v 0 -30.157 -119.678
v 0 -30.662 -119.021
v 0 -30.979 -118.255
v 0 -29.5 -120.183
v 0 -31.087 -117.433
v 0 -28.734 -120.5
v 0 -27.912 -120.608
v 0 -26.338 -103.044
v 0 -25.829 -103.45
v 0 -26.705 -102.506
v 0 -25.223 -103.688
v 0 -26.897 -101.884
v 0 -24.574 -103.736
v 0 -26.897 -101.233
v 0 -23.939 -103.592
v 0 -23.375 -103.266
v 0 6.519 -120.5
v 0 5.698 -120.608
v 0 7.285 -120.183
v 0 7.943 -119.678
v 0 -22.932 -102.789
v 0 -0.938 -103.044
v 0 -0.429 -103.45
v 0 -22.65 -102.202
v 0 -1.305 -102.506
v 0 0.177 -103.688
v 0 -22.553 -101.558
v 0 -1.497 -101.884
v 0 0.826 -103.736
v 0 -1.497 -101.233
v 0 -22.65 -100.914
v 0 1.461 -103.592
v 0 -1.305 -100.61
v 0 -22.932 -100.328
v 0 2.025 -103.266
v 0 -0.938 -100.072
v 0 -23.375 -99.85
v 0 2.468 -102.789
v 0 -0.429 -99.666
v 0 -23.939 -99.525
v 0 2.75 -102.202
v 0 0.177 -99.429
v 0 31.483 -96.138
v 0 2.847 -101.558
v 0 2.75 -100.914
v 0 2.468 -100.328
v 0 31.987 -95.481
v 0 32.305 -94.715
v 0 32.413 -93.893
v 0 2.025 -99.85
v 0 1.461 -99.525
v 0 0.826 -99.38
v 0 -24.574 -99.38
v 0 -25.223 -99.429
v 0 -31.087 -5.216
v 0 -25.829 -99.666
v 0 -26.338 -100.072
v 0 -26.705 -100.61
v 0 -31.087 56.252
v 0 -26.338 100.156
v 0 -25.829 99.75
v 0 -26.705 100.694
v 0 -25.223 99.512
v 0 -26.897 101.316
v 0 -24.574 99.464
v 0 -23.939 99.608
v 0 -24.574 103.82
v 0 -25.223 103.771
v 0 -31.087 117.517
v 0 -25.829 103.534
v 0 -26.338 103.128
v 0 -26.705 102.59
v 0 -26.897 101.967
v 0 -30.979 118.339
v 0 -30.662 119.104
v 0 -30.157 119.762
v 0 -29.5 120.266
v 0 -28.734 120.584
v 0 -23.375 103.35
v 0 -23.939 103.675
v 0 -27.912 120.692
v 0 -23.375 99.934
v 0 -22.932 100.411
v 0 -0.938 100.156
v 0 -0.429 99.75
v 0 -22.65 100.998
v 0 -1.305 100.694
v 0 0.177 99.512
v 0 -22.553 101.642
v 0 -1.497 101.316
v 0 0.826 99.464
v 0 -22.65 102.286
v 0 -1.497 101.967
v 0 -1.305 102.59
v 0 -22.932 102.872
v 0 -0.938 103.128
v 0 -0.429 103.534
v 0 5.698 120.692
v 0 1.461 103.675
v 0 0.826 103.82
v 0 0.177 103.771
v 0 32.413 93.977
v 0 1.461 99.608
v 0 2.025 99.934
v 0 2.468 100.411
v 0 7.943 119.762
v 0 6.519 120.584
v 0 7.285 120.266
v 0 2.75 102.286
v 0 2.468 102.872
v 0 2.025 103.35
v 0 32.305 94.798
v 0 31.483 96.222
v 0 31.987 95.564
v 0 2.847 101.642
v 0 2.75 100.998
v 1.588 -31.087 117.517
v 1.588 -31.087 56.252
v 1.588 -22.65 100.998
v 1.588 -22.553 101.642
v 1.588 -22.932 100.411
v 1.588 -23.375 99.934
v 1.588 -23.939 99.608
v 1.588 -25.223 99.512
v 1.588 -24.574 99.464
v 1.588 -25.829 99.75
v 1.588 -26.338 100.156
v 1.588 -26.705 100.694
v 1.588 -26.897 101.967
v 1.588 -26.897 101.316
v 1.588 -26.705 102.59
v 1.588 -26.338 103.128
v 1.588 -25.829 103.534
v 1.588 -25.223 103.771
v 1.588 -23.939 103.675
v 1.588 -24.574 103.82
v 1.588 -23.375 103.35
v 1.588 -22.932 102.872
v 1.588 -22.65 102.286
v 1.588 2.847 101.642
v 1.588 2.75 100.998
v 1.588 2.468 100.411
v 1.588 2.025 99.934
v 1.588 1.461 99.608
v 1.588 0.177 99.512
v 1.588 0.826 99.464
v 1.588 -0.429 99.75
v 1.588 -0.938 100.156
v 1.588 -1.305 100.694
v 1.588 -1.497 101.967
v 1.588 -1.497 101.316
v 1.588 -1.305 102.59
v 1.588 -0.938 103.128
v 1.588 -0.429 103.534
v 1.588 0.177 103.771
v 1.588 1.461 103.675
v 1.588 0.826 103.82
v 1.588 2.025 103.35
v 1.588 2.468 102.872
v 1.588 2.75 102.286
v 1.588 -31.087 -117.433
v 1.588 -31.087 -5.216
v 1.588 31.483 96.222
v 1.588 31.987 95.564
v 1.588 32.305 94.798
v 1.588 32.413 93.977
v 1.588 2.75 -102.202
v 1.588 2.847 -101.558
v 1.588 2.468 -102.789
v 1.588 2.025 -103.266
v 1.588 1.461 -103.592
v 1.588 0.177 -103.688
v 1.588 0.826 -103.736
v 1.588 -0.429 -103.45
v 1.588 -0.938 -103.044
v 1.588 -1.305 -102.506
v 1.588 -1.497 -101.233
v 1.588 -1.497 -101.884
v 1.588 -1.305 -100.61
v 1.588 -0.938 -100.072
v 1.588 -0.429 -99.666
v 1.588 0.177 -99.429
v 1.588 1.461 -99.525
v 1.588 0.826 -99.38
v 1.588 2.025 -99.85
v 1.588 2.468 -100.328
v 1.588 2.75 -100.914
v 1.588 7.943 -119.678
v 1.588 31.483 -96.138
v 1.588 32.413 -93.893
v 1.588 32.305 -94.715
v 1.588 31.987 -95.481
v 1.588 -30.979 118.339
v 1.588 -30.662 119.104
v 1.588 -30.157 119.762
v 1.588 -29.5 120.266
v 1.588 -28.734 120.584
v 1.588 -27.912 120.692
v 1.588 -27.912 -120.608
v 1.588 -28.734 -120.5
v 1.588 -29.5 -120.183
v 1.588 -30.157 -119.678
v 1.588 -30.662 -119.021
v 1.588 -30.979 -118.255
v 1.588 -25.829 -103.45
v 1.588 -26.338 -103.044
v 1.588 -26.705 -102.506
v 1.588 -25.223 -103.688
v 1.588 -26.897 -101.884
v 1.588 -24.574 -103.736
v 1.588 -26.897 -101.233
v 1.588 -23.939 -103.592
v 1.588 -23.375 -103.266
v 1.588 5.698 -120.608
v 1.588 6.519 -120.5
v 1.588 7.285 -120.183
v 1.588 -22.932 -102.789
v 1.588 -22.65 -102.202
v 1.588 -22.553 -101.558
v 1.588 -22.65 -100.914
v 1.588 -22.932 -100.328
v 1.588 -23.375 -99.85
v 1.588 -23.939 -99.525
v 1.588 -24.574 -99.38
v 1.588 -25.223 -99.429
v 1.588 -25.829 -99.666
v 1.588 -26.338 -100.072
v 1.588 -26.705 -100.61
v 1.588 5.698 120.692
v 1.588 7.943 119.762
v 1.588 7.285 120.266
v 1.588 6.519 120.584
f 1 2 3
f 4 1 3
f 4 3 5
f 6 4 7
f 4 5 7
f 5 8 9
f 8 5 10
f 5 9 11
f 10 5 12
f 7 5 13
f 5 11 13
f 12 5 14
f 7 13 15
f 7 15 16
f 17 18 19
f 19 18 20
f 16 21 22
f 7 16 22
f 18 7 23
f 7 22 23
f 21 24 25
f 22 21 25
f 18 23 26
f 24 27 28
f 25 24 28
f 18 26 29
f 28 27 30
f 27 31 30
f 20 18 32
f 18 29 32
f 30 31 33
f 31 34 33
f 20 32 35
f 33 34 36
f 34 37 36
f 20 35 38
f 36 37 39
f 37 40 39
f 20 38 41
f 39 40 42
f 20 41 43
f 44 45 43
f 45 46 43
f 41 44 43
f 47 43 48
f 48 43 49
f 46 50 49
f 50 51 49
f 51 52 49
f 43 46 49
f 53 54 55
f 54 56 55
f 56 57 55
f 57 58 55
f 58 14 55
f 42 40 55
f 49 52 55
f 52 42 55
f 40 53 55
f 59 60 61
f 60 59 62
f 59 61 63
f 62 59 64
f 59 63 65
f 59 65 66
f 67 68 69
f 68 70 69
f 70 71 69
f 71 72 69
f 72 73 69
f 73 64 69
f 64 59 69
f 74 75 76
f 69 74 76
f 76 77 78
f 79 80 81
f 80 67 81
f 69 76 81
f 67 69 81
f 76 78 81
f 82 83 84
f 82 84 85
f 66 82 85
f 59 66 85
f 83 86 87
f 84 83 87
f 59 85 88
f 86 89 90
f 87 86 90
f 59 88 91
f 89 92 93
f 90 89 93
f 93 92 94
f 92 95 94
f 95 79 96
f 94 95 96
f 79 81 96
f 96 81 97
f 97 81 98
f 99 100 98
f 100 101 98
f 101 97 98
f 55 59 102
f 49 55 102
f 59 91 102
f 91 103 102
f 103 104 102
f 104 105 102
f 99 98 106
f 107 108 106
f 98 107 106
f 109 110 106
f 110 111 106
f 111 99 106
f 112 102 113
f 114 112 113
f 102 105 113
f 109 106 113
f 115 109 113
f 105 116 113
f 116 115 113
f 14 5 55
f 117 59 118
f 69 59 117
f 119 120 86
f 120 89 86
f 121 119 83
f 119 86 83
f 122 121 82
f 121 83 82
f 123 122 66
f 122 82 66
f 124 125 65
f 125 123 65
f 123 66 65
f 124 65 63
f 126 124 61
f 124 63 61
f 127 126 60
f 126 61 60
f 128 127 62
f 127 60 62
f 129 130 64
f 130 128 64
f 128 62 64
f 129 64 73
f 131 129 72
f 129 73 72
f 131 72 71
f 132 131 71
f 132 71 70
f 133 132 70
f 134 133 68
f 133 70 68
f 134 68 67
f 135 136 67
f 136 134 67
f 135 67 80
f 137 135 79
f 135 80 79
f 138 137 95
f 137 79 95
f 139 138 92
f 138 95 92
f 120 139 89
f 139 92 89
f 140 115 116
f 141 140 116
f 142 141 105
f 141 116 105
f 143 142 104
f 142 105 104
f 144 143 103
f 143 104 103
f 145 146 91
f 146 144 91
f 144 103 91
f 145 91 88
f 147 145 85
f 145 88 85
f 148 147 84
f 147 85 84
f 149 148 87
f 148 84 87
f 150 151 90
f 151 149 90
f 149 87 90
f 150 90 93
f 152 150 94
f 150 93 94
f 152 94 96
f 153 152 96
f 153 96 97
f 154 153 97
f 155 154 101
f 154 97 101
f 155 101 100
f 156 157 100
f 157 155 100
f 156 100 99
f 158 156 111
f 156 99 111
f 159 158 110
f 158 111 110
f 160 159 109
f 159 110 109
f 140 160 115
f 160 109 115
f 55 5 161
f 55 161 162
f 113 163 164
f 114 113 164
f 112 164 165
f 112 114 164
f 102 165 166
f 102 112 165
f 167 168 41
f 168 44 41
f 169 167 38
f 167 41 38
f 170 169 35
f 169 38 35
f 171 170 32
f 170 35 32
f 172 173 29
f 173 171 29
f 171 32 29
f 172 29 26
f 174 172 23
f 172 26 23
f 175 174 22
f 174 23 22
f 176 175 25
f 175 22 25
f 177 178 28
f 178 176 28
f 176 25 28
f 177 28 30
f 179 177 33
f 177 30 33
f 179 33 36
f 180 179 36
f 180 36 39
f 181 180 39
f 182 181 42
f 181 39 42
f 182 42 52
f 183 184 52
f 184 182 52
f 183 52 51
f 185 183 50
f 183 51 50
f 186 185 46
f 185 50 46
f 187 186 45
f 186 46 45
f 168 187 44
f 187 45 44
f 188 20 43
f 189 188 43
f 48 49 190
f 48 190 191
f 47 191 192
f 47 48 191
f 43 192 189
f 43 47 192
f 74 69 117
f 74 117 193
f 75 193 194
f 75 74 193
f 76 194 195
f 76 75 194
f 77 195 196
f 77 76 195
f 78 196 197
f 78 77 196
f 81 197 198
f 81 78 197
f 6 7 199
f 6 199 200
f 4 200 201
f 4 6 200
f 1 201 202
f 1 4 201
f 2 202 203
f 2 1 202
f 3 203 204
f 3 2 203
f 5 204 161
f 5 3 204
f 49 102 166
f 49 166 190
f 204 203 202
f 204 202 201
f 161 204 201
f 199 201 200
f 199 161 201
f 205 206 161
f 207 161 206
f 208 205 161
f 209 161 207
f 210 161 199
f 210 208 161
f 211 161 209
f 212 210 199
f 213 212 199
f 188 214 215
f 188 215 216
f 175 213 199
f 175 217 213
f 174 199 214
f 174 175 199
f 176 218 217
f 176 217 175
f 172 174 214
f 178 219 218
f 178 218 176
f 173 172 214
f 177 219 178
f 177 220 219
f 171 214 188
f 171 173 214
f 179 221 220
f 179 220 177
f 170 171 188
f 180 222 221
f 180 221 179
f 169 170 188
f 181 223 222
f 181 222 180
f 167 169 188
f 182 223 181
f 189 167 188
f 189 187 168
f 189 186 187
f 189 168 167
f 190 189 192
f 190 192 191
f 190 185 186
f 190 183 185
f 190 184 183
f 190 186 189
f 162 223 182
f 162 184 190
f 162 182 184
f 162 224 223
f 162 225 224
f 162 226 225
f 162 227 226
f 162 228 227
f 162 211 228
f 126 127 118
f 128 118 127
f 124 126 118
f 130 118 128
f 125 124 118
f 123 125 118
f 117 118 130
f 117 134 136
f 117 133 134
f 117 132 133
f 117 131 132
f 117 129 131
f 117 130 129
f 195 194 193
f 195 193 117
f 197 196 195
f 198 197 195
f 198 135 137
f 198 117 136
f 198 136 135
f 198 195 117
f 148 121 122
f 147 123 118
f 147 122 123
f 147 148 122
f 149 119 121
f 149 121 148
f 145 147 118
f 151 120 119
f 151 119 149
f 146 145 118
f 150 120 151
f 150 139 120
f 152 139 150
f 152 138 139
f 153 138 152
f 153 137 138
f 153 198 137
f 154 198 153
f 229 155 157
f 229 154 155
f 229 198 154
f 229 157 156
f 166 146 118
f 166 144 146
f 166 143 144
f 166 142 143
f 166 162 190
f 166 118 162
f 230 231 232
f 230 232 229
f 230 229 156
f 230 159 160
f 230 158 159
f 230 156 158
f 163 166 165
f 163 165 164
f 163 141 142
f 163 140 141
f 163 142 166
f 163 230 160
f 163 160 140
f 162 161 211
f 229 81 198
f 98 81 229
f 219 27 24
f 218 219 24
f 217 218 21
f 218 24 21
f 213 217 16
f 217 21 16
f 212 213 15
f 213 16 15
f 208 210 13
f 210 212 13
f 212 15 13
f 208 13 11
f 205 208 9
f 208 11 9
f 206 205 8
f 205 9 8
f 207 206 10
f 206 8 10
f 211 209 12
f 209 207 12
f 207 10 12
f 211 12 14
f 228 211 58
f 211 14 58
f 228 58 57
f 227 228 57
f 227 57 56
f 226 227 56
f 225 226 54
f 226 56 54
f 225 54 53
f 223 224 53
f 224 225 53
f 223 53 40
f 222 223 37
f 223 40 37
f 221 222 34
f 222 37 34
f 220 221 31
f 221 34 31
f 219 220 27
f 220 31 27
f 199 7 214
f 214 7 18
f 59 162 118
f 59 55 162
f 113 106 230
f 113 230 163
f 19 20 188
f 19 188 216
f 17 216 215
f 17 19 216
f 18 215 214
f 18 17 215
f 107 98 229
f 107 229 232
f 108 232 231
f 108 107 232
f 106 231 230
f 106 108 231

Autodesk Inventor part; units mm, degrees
ref_plane "YZ Plane" through (0, 0, 0) normal (1, 0, 0) x (0, 1, 0)
ref_plane "XZ Plane" through (0, 0, 0) normal (0, 1, 0) x (-1, 0, 0)
ref_plane "XY Plane" through (0, 0, 0) normal (0, 0, 1) x (1, 0, 0)
sketch "Sketch1" plane through (0, 0, 0) normal (1, 0, 0) x (0, 1, 0)
  line L0 (-31.0872, -5.216) -> (-31.0872, 56.252)
  line L1 (-31.0872, -117.4332) -> (-31.0872, 117.5168)
  line L2 (-27.9122, 120.6918) -> (5.6976, 120.6918)
  line L3 (-27.9122, -120.6082) -> (5.6976, -120.6082)
  line L4 (32.4128, 93.9766) -> (32.4128, -93.8931)
  line L5 (7.9427, 119.7618) -> (31.4828, 96.2217)
  line L6 (7.9427, -119.6783) -> (31.4828, -96.1382)
  arc A0 (32.4128, 93.9766) -> (31.4828, 96.2217) centre (29.2378, 93.9766) ccw
  arc A1 (31.4828, -96.1382) -> (32.4128, -93.8931) centre (29.2378, -93.8931) ccw
  arc A2 (5.6976, -120.6082) -> (7.9427, -119.6783) centre (5.6976, -117.4332) ccw
  arc A3 (-31.0872, -117.4332) -> (-27.9122, -120.6082) centre (-27.9122, -117.4332) ccw
  arc A4 (-27.9122, 120.6918) -> (-31.0872, 117.5168) centre (-27.9122, 117.5168) ccw
  arc A5 (7.9427, 119.7618) -> (5.6976, 120.6918) centre (5.6976, 117.5168) ccw
  circle A6 centre (0.6628, 101.6418) radius 2.1844
  circle A7 centre (-24.7372, 101.6418) radius 2.1844
  circle A8 centre (-24.7372, -101.5582) radius 2.1844
  circle A9 centre (0.6628, -101.5582) radius 2.1844
  point P0 (0, 0)
  point P1 (-31.0872, -120.6082)
  point P2 (-31.0872, 120.6918)
  point P3 (7.0128, 120.6918)
  point P4 (7.0128, -120.6082)
  dimension "d0" = 241.3
  dimension "d1" = 38.1
  dimension "d2" = 38.1
  dimension "d3" = 3.175
  dimension "d4" = 3.175
  dimension "d5" = 3.175
  dimension "d6" = 3.175
  dimension "d7" = 3.175
  dimension "d8" = 3.175
  dimension "d15" = 4.3688
  dimension "d16" = 4.3688
  dimension "d17" = 4.3688
  dimension "d18" = 4.3688
extrude "Extrusion1" add sketch "Sketch1" along normal blind 1.5875
properties part number "wedge"
